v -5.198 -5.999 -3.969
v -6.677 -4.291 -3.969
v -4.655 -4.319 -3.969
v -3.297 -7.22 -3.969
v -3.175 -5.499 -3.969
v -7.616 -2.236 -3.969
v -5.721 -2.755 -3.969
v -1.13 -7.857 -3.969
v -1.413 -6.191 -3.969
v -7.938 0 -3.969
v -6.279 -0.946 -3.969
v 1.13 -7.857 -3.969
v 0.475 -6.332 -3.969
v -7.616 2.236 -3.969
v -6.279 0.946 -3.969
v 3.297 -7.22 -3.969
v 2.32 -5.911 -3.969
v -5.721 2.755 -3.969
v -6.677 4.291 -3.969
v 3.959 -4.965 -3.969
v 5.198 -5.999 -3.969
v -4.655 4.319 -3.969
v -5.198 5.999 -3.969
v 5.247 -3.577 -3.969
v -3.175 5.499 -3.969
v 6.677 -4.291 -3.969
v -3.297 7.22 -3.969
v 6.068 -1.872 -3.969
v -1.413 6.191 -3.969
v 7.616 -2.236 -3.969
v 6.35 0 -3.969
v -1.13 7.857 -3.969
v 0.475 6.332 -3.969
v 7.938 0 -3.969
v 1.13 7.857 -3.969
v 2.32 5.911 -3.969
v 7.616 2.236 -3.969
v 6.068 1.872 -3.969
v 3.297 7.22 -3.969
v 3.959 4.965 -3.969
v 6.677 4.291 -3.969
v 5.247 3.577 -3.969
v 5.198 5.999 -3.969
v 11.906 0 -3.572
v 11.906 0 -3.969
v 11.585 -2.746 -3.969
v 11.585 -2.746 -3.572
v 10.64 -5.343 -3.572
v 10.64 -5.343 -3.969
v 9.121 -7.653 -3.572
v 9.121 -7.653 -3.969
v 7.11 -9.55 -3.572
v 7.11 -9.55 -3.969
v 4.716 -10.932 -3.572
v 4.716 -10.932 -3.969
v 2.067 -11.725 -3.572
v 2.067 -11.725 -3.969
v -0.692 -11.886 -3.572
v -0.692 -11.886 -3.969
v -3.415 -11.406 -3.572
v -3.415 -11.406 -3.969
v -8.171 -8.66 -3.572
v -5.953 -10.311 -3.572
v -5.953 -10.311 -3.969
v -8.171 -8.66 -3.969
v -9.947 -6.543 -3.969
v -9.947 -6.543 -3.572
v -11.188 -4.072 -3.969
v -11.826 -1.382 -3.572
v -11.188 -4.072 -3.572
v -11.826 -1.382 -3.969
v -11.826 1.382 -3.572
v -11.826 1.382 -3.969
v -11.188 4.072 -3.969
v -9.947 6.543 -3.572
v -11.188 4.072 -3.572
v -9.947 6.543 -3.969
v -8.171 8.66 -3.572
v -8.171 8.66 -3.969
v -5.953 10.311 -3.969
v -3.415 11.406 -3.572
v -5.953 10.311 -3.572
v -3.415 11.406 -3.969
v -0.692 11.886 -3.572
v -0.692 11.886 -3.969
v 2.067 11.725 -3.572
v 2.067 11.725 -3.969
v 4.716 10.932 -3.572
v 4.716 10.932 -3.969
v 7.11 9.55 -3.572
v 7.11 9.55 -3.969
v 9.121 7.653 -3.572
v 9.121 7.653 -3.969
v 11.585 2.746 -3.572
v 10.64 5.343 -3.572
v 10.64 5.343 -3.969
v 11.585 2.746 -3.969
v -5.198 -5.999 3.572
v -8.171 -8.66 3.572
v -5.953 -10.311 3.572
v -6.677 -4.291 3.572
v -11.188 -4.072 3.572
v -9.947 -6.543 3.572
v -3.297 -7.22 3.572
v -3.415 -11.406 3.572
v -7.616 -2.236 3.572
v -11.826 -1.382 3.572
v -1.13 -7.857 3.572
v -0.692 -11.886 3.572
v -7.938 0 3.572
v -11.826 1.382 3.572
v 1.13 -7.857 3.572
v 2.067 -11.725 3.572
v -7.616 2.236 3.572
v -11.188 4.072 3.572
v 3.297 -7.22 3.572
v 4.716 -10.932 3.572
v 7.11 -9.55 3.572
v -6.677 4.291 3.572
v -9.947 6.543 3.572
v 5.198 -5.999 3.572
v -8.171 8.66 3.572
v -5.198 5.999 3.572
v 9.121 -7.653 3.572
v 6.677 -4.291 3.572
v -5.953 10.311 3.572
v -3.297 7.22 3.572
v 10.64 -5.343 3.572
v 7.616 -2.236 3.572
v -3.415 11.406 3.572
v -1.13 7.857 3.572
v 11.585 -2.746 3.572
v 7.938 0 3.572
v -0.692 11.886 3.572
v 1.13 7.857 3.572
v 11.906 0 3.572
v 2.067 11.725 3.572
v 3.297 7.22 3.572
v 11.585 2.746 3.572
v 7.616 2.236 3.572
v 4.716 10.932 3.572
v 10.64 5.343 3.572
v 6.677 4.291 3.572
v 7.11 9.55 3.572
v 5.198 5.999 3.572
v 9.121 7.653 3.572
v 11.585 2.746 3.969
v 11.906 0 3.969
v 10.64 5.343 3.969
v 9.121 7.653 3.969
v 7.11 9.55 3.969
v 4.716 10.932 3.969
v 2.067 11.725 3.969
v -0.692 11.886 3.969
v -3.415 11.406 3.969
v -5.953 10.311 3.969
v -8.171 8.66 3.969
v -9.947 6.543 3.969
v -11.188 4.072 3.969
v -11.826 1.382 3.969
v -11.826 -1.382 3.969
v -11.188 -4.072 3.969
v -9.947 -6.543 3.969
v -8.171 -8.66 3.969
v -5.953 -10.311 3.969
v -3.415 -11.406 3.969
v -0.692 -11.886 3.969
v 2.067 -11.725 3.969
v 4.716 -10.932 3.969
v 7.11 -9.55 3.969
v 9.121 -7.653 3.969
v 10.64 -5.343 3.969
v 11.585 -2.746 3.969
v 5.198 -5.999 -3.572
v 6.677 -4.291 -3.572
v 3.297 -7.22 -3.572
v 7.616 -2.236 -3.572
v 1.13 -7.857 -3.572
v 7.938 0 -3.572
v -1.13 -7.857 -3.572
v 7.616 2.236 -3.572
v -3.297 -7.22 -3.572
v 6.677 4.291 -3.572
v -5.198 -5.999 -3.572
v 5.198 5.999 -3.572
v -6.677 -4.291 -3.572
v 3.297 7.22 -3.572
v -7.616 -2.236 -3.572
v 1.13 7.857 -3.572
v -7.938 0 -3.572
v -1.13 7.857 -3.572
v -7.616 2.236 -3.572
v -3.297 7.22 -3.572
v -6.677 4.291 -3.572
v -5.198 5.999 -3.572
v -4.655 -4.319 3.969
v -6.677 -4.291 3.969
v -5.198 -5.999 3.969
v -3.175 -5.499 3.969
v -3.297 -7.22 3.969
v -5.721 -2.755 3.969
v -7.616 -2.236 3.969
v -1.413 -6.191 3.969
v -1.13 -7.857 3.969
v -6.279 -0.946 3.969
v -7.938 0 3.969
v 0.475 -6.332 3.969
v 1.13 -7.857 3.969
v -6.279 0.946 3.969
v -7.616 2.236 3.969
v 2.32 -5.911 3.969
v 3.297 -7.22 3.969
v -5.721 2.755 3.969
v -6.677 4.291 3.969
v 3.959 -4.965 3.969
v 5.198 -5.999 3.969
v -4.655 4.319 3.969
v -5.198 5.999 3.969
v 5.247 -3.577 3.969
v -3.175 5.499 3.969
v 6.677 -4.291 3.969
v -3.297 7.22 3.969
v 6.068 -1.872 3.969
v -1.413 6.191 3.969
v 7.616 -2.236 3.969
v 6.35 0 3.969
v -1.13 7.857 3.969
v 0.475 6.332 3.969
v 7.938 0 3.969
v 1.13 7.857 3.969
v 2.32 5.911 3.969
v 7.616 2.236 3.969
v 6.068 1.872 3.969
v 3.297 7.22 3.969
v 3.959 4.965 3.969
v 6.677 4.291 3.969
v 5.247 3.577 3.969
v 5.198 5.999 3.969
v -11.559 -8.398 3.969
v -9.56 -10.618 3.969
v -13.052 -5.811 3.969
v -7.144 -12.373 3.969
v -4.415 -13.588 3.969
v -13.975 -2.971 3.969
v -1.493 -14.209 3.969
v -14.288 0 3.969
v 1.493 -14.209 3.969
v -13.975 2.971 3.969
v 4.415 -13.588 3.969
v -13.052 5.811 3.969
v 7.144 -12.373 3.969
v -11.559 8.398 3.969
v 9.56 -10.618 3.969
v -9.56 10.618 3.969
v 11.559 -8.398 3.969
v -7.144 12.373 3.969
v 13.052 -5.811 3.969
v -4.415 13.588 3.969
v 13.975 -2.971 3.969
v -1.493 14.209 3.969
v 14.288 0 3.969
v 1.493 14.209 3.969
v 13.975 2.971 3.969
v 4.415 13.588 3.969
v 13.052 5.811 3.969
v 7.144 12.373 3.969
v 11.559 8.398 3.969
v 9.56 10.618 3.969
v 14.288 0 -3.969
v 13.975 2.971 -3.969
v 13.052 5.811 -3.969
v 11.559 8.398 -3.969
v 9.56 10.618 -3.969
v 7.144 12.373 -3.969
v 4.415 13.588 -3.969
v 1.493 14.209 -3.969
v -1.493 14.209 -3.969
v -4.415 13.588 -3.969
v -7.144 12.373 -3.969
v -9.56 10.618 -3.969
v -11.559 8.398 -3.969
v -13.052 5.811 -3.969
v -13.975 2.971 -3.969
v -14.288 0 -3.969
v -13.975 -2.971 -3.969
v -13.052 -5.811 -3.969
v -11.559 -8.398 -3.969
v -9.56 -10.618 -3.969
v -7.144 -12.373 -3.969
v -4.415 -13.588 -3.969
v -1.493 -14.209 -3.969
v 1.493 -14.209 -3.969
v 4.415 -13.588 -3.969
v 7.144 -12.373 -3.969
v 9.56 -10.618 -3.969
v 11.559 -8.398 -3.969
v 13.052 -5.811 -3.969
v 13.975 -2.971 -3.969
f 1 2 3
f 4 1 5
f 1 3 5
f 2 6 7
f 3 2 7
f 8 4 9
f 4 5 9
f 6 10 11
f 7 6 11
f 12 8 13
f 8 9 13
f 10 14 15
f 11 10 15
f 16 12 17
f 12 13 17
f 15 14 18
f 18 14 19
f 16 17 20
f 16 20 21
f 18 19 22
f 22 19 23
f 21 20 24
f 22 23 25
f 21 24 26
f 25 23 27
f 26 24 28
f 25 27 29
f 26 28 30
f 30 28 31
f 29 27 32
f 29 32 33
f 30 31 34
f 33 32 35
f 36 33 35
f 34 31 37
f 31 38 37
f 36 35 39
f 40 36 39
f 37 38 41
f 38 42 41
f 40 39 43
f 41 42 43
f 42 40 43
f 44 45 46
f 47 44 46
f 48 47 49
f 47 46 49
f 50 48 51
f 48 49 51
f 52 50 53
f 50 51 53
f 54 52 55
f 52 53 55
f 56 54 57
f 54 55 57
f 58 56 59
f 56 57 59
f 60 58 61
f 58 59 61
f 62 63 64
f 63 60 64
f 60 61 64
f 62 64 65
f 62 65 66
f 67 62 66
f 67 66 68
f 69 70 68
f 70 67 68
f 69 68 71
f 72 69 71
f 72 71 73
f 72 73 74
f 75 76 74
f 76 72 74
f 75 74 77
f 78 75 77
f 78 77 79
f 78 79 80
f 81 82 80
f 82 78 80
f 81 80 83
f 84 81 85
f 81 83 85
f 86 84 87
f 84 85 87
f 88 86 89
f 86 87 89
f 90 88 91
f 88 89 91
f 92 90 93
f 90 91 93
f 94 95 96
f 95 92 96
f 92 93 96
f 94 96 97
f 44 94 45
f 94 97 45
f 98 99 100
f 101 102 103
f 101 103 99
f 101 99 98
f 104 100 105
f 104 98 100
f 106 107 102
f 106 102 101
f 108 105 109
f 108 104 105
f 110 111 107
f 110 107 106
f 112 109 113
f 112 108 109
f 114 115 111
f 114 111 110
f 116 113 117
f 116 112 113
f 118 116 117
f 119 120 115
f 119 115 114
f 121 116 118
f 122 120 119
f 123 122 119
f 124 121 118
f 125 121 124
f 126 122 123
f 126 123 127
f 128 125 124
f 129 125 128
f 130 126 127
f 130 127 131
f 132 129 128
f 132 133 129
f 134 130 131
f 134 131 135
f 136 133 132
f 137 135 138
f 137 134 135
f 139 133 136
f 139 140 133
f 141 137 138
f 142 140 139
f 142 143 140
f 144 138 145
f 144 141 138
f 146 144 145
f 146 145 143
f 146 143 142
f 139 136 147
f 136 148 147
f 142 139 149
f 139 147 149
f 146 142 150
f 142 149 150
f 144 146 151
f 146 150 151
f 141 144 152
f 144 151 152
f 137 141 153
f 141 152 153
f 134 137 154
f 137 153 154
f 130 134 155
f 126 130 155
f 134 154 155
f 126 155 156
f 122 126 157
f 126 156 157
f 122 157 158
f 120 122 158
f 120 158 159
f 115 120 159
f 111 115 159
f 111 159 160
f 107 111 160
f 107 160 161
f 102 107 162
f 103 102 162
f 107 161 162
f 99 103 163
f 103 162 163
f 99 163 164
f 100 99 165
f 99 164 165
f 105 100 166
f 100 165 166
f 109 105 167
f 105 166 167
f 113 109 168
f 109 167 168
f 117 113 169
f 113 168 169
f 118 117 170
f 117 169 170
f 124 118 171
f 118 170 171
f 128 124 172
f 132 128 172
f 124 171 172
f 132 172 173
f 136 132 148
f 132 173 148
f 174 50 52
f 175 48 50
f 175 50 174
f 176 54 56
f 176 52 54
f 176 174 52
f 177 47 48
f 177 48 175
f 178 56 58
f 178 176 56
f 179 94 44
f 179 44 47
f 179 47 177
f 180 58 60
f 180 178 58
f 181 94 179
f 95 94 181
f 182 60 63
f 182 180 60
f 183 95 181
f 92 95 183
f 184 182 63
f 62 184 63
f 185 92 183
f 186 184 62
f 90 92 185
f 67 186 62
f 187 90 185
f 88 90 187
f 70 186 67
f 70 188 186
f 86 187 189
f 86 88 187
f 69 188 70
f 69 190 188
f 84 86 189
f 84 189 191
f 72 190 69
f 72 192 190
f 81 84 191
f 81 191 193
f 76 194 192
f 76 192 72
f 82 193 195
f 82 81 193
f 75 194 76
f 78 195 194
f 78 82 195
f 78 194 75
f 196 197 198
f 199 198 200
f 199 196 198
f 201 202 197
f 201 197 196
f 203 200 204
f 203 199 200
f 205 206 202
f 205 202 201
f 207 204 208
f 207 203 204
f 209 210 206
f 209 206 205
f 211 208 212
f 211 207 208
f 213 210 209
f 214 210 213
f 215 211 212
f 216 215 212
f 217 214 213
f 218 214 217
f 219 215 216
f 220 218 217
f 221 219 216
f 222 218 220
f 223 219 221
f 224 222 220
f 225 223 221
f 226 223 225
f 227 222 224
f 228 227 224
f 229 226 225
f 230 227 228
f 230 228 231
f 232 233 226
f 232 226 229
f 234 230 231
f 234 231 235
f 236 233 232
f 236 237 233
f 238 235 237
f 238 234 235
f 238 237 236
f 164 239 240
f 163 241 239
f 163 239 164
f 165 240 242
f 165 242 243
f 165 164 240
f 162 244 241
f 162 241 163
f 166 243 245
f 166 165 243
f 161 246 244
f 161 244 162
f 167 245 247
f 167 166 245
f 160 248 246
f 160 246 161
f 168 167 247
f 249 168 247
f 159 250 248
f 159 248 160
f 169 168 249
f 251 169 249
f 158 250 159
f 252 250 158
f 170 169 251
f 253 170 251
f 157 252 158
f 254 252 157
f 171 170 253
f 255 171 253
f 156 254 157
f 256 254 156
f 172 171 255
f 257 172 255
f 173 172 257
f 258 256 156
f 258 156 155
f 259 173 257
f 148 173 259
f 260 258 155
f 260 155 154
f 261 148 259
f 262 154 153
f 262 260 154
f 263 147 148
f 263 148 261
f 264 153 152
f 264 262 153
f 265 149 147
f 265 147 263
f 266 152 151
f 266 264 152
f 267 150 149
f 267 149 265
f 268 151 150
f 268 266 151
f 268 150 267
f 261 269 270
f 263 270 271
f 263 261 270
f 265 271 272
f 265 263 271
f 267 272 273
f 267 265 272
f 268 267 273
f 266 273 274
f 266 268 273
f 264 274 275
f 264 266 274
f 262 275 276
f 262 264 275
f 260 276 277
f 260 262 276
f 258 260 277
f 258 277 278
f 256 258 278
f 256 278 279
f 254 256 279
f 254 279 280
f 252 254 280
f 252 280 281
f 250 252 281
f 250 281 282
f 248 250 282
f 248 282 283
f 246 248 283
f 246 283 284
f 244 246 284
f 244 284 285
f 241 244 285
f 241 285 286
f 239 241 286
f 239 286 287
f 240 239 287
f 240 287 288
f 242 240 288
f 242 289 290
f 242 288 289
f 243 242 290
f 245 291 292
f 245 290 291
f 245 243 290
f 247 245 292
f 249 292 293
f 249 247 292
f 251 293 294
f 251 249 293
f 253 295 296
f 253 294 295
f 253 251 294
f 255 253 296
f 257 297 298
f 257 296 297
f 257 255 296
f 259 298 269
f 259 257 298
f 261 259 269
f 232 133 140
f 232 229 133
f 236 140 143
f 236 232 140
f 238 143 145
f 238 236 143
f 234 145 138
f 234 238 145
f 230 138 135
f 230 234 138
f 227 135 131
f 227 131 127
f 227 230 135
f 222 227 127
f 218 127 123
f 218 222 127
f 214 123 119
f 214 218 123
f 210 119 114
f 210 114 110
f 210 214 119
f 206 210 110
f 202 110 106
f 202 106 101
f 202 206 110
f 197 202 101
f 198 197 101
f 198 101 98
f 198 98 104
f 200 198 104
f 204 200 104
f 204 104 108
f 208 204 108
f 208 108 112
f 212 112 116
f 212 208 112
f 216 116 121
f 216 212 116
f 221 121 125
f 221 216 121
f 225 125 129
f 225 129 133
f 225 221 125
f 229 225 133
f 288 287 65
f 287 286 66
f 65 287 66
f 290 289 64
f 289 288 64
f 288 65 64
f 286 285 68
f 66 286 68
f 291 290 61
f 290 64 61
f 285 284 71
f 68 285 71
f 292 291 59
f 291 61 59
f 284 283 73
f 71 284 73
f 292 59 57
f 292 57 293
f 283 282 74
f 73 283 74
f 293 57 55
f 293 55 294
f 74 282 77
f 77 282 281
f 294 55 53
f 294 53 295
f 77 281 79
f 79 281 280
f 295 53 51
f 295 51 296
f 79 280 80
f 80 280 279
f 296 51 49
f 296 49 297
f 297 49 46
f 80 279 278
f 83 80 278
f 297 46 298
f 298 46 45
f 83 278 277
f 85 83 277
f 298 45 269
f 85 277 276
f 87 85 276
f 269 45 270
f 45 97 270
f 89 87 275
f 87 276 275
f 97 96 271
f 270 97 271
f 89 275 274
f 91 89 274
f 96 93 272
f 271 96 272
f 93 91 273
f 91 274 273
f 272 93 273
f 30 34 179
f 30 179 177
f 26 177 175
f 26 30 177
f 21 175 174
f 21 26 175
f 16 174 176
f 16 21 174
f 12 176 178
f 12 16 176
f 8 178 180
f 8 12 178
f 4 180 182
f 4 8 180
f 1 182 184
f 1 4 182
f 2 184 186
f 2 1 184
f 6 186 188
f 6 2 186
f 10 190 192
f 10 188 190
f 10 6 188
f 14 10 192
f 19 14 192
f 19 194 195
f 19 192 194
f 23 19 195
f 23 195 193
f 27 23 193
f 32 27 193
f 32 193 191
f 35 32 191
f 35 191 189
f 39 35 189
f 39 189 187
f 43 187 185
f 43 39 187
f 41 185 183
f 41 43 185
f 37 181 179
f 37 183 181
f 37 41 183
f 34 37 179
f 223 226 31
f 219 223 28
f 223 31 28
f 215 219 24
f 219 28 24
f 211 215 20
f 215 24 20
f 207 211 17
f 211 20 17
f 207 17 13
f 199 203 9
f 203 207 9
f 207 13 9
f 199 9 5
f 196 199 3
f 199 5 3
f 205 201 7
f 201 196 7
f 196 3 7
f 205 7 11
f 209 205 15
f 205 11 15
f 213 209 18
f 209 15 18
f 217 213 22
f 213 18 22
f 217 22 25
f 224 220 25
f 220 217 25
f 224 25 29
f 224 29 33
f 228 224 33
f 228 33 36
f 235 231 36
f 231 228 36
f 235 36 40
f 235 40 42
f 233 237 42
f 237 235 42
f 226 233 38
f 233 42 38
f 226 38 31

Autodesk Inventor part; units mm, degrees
ref_plane "YZ Plane" through (0, 0, 0) normal (1, 0, 0) x (0, 1, 0)
ref_plane "XZ Plane" through (0, 0, 0) normal (0, 1, 0) x (-1, 0, 0)
ref_plane "XY Plane" through (0, 0, 0) normal (0, 0, 1) x (1, 0, 0)
sketch "Sketch1" plane through (0, 0, 0) normal (0, 0, 1) x (1, 0, 0)
  line L0 (-20.0025, 0) -> (20.0025, 0) projected
  line L1 (0, -20.0025) -> (0, 20.0025) projected
  circle A0 centre (0, 0) radius 14.2875
  circle A1 centre (0, 0) radius 6.35
  dimension "d0" = 12.7
  dimension "d1" = 28.575
extrude "Base" add sketch "Sketch1" along normal mid plane 7.9375 contours A1 L1 A0 L0 | L0 A0 L1 A1 | A1 L0 A0 L1 | L1 A0 L0 A1
sketch "Sketch3" plane through (0, 0, 3.9688) normal (0, 0, 1) x (1, 0, 0)
  circle A0 centre (0, 0) radius 14.2875
  circle A1 centre (0, 0) radius 6.35
  circle A2 centre (0, 0) radius 7.9375
  circle A3 centre (0, 0) radius 11.9062
  circle A4 centre (0, 0) radius 6.35 projected
  circle A5 centre (0, 0) radius 14.2875 projected
  dimension "d7" = 1.5875
  dimension "d8" = 2.3813
extrude "Cutaway" cut sketch "Sketch3" against normal blind 0.3969 contours A3
mirror "Mirror2" about plane through (0, 0, 0) normal (0, 0, 1) of "Cutaway"
properties part number "bearing" material "Steel"
